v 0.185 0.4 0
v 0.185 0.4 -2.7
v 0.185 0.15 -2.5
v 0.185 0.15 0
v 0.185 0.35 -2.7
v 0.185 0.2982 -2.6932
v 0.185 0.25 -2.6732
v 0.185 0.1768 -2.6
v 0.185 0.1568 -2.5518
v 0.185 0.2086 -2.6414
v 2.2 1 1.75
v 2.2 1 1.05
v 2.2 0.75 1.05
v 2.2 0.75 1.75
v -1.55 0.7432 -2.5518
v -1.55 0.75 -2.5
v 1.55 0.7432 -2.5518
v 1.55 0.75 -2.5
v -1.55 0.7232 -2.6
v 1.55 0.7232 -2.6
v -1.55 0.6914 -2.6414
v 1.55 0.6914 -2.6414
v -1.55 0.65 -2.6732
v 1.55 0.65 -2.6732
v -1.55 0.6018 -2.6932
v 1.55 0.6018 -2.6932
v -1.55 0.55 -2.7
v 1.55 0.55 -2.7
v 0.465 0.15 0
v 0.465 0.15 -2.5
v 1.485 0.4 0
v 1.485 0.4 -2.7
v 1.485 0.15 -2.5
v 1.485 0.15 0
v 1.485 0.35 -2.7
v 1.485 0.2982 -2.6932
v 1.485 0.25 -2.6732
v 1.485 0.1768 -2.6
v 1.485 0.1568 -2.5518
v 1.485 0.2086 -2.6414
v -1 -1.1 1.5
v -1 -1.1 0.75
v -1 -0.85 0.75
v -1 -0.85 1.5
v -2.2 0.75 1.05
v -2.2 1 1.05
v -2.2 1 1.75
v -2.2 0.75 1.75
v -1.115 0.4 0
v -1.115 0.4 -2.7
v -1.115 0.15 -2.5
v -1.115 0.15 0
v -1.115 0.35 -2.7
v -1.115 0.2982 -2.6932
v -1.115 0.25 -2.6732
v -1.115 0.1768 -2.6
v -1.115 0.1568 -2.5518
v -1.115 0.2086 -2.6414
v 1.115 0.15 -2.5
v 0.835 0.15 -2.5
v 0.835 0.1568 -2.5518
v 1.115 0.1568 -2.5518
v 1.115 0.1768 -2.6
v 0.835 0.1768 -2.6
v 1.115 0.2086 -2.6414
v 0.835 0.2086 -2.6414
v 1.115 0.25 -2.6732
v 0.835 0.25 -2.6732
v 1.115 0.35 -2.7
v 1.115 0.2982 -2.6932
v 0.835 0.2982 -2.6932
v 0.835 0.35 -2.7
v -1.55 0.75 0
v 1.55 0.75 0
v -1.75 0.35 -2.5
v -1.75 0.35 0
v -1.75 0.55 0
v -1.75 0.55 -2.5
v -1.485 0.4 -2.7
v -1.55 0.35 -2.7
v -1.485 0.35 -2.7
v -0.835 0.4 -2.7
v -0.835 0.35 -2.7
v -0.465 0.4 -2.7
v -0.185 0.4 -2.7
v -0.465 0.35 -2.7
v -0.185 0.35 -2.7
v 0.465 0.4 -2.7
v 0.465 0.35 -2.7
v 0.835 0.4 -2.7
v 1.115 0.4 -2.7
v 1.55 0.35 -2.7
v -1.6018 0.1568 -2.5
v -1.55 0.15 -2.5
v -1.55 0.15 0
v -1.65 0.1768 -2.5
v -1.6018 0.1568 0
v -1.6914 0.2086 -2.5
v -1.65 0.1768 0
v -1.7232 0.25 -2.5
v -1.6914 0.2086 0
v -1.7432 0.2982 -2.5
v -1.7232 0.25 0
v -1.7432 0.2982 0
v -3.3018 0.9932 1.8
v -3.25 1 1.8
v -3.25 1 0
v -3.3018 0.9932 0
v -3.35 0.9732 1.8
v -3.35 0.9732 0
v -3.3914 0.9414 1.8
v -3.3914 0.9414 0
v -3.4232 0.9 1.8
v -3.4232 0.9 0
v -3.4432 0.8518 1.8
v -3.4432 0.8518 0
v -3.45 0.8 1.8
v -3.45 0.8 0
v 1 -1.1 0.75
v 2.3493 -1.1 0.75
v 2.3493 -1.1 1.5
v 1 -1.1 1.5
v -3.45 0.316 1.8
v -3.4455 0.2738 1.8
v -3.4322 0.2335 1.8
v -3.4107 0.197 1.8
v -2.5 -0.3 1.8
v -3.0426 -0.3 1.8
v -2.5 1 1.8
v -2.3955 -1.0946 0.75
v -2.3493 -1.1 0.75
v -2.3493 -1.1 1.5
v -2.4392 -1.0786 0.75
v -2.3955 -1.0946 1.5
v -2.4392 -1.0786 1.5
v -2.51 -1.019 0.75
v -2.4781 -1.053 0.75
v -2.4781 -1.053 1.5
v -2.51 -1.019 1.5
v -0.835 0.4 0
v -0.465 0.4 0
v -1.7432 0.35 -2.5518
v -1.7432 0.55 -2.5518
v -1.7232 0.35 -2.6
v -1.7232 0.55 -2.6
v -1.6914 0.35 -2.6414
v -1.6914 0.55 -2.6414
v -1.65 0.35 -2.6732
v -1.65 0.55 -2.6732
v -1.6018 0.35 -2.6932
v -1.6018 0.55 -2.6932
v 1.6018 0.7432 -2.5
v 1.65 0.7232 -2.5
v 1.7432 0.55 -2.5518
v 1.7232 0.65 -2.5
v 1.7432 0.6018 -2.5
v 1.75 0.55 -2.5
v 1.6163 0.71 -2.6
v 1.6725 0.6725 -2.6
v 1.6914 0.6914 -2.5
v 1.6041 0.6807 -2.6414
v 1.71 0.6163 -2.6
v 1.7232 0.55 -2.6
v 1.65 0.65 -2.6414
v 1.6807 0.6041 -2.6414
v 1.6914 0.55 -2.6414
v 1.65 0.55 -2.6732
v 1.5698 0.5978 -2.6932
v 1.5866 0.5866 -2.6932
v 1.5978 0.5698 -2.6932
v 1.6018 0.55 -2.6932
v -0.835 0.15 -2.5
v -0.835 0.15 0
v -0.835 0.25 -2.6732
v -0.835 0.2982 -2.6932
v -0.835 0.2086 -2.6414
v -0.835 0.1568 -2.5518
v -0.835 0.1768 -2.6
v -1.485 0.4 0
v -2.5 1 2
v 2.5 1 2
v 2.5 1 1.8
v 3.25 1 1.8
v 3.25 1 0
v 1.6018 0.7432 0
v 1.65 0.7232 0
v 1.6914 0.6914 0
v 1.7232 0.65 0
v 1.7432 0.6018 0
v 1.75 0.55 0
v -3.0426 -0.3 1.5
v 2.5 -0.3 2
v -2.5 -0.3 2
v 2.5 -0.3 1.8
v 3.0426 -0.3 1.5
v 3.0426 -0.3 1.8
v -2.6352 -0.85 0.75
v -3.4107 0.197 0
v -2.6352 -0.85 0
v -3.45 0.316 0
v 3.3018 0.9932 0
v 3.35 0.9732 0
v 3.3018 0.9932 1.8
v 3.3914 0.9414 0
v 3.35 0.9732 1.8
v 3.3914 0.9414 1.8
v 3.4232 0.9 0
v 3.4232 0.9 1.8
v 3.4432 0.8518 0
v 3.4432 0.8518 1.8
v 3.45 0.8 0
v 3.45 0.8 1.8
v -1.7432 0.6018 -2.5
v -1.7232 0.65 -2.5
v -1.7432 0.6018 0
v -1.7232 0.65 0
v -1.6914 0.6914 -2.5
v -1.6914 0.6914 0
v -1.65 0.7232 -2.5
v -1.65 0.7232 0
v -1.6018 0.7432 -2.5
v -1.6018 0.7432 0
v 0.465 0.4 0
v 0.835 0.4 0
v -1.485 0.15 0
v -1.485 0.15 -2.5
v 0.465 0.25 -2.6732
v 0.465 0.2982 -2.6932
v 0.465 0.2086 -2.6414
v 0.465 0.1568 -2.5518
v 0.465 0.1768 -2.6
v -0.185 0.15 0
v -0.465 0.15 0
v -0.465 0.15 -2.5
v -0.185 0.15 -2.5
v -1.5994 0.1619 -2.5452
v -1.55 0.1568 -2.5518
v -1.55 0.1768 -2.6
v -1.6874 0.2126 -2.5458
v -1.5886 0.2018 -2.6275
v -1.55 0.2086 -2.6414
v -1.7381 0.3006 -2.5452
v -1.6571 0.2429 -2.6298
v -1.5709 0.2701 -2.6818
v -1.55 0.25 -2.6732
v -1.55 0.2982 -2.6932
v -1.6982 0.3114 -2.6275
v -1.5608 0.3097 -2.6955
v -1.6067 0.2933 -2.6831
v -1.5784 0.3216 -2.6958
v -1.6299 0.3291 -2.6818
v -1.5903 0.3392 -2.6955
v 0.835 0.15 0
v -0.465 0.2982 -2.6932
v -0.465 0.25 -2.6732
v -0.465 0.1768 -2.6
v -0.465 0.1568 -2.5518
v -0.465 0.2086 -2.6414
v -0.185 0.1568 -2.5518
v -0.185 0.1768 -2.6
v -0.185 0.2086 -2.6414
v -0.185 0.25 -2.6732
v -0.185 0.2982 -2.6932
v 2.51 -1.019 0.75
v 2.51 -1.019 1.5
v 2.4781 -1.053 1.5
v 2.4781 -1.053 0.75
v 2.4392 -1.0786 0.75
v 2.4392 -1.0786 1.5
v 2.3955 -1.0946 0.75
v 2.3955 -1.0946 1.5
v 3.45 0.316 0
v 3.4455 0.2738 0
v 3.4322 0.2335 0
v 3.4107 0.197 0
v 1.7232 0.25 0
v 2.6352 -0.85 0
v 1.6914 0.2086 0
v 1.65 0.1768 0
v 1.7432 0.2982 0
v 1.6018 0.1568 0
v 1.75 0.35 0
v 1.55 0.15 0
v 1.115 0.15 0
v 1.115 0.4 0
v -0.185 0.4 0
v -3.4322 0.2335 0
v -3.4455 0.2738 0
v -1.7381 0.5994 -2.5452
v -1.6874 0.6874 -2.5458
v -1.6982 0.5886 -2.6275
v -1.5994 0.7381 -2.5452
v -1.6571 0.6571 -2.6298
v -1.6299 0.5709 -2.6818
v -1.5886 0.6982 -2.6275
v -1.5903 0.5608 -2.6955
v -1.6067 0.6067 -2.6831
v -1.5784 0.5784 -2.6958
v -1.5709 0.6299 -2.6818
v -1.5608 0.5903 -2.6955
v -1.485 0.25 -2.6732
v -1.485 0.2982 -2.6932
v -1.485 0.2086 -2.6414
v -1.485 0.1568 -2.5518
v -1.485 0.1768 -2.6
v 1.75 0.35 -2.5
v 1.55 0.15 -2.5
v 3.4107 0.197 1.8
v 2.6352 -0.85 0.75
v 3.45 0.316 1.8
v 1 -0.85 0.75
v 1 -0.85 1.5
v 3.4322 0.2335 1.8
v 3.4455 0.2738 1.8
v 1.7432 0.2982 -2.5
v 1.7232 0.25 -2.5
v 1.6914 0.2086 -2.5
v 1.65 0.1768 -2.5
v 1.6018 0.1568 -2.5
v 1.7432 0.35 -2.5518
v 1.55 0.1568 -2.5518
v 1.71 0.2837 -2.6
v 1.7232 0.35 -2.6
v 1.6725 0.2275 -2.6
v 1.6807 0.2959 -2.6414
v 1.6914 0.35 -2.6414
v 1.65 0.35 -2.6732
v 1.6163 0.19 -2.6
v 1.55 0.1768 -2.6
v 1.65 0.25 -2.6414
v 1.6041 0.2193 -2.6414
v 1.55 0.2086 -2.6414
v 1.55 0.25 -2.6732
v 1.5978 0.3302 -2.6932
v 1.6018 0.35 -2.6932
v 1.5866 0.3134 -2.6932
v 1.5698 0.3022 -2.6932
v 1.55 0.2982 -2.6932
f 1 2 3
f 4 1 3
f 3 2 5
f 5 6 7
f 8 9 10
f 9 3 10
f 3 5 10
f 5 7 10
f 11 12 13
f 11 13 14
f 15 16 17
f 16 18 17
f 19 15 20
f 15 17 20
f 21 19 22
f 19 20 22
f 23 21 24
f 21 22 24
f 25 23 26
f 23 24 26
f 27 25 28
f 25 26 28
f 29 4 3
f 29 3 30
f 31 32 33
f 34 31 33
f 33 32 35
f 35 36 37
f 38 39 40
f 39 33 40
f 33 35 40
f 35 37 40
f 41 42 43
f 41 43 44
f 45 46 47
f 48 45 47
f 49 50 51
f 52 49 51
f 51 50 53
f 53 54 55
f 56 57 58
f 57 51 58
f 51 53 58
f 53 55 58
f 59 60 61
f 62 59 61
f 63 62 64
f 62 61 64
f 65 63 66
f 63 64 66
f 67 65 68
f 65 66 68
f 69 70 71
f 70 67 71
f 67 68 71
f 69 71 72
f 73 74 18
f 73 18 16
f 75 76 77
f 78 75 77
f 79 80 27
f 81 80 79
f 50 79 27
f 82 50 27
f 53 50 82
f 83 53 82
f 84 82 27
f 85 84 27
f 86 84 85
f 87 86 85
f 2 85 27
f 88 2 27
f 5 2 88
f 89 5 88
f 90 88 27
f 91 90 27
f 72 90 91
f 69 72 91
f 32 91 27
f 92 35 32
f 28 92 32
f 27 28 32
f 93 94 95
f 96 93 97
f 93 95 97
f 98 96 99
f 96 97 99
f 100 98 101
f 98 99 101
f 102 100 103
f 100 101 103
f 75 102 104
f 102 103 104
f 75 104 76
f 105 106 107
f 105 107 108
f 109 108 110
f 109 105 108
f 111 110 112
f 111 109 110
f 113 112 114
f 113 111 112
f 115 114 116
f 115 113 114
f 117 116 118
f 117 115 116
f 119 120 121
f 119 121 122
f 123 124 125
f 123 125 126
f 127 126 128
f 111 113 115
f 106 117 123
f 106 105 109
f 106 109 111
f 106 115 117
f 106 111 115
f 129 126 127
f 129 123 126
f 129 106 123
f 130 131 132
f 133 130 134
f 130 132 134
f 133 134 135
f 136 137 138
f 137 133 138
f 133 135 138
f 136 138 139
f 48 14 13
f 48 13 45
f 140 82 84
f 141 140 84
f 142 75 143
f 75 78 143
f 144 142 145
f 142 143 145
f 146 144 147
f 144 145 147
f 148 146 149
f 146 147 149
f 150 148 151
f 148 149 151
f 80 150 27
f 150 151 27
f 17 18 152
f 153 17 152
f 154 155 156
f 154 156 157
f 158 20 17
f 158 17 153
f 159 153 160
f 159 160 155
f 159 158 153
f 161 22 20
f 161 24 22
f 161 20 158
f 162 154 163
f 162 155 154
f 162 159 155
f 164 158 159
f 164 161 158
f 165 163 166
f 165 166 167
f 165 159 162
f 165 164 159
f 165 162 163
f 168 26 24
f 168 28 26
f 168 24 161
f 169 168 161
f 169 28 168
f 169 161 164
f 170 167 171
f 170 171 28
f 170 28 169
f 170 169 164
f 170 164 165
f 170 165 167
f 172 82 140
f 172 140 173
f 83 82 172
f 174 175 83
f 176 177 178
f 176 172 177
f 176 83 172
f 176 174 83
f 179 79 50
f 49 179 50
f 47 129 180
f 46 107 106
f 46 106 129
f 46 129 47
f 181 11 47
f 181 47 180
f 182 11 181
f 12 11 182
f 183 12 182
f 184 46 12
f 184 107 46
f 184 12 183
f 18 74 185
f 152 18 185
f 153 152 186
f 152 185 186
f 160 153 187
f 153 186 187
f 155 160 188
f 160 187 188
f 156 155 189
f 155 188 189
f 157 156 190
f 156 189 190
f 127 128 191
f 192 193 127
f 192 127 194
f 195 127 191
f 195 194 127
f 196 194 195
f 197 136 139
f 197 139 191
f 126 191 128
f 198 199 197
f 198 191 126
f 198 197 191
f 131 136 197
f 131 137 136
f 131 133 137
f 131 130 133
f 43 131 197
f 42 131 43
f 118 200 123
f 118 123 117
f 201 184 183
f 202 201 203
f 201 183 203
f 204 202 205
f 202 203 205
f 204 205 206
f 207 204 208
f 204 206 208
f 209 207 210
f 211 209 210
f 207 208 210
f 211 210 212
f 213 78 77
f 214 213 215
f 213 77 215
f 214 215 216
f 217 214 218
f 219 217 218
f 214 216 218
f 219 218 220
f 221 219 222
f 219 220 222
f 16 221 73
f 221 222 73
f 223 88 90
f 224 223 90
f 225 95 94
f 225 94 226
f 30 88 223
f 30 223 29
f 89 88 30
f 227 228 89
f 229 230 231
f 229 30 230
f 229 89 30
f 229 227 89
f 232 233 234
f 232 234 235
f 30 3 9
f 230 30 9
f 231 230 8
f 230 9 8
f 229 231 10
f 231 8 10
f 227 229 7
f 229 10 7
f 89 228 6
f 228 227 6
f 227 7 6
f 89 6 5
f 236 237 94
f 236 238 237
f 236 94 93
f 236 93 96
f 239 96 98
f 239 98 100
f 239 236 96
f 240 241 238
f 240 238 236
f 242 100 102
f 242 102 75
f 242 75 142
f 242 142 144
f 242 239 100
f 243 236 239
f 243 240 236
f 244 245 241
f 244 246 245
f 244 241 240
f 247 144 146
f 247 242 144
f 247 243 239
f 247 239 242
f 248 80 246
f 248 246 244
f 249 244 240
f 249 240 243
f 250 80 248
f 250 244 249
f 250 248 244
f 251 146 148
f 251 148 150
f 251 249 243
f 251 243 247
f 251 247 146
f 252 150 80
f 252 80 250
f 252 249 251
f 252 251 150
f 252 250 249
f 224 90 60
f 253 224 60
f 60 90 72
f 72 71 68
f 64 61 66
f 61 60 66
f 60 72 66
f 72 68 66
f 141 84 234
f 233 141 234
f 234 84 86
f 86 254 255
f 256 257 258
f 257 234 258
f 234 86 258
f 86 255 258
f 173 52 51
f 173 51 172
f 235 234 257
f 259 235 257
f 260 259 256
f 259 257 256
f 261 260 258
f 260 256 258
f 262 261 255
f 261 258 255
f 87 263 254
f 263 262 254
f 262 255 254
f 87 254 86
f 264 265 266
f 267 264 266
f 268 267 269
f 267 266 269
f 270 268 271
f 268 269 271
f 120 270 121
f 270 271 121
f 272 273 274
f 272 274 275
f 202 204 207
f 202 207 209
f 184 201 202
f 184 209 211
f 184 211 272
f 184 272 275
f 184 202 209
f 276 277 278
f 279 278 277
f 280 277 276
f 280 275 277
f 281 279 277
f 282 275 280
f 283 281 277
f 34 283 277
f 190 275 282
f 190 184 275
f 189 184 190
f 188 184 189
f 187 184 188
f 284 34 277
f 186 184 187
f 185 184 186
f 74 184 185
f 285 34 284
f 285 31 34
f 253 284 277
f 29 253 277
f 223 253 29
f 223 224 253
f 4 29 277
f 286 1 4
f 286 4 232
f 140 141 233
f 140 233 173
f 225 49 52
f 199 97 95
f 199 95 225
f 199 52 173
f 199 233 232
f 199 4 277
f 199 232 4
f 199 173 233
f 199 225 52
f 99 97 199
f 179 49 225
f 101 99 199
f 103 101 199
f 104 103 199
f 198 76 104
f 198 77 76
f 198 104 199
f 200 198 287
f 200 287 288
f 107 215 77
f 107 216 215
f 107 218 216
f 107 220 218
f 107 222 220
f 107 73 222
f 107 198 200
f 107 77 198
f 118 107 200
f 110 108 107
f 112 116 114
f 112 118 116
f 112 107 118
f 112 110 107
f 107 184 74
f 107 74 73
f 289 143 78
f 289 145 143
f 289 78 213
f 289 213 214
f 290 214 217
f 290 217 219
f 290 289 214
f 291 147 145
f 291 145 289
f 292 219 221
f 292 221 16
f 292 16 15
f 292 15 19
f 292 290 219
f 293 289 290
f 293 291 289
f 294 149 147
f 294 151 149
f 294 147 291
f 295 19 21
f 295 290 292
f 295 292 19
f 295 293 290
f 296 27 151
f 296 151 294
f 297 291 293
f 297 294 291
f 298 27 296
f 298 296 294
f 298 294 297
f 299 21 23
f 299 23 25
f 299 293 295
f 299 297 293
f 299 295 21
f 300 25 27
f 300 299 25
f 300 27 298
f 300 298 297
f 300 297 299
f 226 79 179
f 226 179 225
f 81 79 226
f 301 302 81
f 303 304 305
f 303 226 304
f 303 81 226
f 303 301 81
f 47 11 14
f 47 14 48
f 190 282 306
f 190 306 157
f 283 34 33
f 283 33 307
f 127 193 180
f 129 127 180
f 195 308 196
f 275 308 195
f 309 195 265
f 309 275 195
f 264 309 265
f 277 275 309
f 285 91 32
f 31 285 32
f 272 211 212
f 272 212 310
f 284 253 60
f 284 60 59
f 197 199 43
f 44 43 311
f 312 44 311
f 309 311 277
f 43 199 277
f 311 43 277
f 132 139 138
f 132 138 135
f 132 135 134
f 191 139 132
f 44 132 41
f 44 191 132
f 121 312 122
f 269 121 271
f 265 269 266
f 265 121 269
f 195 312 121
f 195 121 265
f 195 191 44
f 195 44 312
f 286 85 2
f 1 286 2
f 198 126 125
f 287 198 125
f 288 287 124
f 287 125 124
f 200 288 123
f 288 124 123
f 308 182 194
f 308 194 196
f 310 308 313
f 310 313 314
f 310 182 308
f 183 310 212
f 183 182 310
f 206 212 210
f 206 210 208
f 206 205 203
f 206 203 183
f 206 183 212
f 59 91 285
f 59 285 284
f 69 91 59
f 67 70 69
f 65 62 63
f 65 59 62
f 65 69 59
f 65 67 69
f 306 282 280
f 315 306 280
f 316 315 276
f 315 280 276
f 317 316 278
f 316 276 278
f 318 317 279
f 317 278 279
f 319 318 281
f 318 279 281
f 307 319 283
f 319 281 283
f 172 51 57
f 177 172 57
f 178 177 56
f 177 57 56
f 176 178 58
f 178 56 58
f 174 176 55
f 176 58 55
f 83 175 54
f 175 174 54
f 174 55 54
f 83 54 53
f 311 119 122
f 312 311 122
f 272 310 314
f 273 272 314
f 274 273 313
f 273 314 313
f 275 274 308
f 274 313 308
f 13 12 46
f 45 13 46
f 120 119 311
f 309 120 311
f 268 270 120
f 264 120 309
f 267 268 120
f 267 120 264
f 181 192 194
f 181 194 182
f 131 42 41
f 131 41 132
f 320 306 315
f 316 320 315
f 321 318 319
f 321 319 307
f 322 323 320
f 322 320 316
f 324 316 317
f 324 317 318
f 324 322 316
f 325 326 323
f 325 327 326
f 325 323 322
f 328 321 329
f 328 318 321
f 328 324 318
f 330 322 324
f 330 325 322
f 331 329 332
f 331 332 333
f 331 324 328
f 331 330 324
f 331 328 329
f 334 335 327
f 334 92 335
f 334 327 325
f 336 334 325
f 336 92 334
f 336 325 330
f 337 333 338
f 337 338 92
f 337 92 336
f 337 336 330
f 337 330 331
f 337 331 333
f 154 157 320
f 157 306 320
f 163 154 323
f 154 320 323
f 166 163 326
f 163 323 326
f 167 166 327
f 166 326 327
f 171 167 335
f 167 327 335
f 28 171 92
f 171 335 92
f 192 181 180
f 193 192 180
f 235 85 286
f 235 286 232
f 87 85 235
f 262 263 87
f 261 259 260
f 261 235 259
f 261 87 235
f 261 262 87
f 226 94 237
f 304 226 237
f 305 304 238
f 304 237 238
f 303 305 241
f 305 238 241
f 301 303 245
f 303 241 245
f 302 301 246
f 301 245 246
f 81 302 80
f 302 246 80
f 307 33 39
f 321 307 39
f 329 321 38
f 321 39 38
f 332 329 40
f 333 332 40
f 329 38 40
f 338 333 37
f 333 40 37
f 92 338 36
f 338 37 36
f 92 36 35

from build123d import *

# Parameters (mm, degrees)
PAD_DEPTH           = 2
FILLET_R            = 0.2
SKETCH001_W         = 6.9
SKETCH001_H         = 0.8
POCKET_DEPTH        = 0.5
SKETCH002_W         = 0.95
SKETCH002_H         = 1.3
POCKET001_DEPTH     = 0.2
SKETCH003_W         = 2
SKETCH003_H         = 1.5
POCKET002_DEPTH     = 0.25
SKETCH004_W         = 6.9
SKETCH004_H         = 0.25
POCKET003_DEPTH     = 0.75
SKETCH005_W         = 4.4
SKETCH005_H         = 0.7
POCKET004_DEPTH     = 0.25
PAD001_DEPTH        = 2.7
FILLET001_R         = 0.2
SKETCH007_W         = 0.37
SKETCH007_H         = 0.25
POCKET005_DEPTH     = 2.7
LINEARPATTERN_COUNT = 5
LINEARPATTERN_PITCH = 0.65


with BuildPart() as part:
    # Sketch → Pad (new body)
    with BuildSketch(Plane.XY):
        Polygon((-3.45, 1), (3.45, 1), (3.45, 0.25), (2.45, -1.1), (-2.45, -1.1), (-3.45, 0.25), align=None)
    extrude(amount=PAD_DEPTH)

    # Fillet
    fillet_edges = [part.edges().sort_by_distance(p)[0] for p in [
        (3.45, 1, 1),
        (3.45, 0.25, 1),
        (2.45, -1.1, 1),
        (-2.45, -1.1, 1),
        (-3.45, 0.25, 1),
        (-3.45, 1, 1),
    ]]
    fillet(fillet_edges, radius=FILLET_R)

    # Sketch001 (on Face5 of Fillet) → Pocket (cut)
    with BuildSketch(Plane.XY.offset(2)):
        with Locations((0, -0.7)):
            Rectangle(SKETCH001_W, SKETCH001_H)
    extrude(amount=-POCKET_DEPTH, mode=Mode.SUBTRACT)

    # Sketch002 (on Face4 of Pocket) → Pocket001 (cut)
    with BuildSketch(Plane.XY.offset(2)):
        with Locations((-2.975, 0.35)):
            Rectangle(SKETCH002_W, SKETCH002_H)
        with Locations((2.975, 0.35)):
            Rectangle(SKETCH002_W, SKETCH002_H)
    extrude(amount=-POCKET001_DEPTH, mode=Mode.SUBTRACT)

    # Sketch003 (on Face8 of Pocket001) → Pocket002 (cut)
    with BuildSketch(Plane.XZ.offset(1.1)):
        with Locations((0, 0.75)):
            Rectangle(SKETCH003_W, SKETCH003_H)
    extrude(amount=-POCKET002_DEPTH, mode=Mode.SUBTRACT)

    # Sketch004 (on Face2 of Pocket002) → Pocket003 (cut)
    with BuildSketch(Plane(origin=(0, 0, 0), x_dir=(1, 0, 0), z_dir=(0, 0, -1))):
        with Locations((0, 0.975)):
            Rectangle(SKETCH004_W, SKETCH004_H)
    extrude(amount=-POCKET003_DEPTH, mode=Mode.SUBTRACT)

    # Sketch005 (on Face12 of Pocket003) → Pocket004 (cut)
    with BuildSketch(Plane(origin=(0, 1, 0), x_dir=(-1, 0, 0), z_dir=(0, 1, 0))):
        with Locations((0, 1.4)):
            Rectangle(SKETCH005_W, SKETCH005_H)
    extrude(amount=-POCKET004_DEPTH, mode=Mode.SUBTRACT)

    # Sketch006 (on Face2 of Pocket004) → Pad001 (join)
    with BuildSketch(Plane(origin=(0, 0, 0), x_dir=(1, 0, 0), z_dir=(0, 0, -1))):
        with BuildLine():
            Line((-1.55, -0.15), (1.55, -0.15))
            ThreePointArc((1.750006, -0.35), (1.691425, -0.208577), (1.55, -0.15))
            Line((1.750006, -0.35), (1.750006, -0.55))
            ThreePointArc((1.550006, -0.75), (1.691427, -0.691421), (1.750006, -0.55))
            Line((1.550006, -0.75), (-1.549994, -0.75))
            ThreePointArc((-1.749994, -0.55), (-1.691416, -0.691421), (-1.549994, -0.75))
            Line((-1.749994, -0.35), (-1.749994, -0.55))
            ThreePointArc((-1.55, -0.15), (-1.691418, -0.208581), (-1.749994, -0.35))
        make_face()
    extrude(amount=PAD001_DEPTH)

    # Fillet001
    fillet001_edges = [part.edges().sort_by_distance(p)[0] for p in [
        (-1.691418, 0.208581, -2.7),
        (0, 0.15, -2.7),
        (1.691425, 0.208577, -2.7),
        (1.750006, 0.45, -2.7),
        (1.691427, 0.691421, -2.7),
        (6e-06, 0.75, -2.7),
        (-1.691416, 0.691421, -2.7),
        (-1.749994, 0.45, -2.7),
    ]]
    fillet(fillet001_edges, radius=FILLET001_R)

    # Sketch007 (on Face8 of Fillet001) → Pocket005 (cut)
    with BuildSketch(Plane(origin=(0, 0, -2.7), x_dir=(1, 0, 0), z_dir=(0, 0, -1))):
        with Locations((-1.3, -0.275)):
            Rectangle(SKETCH007_W, SKETCH007_H)
    pocket005 = extrude(amount=-POCKET005_DEPTH, mode=Mode.SUBTRACT)

    # LinearPattern: Pocket005 ×5
    with Locations(*[(i * LINEARPATTERN_PITCH, 0, 0) for i in range(1, LINEARPATTERN_COUNT)]):
        add(pocket005, mode=Mode.SUBTRACT)


solid = part.part
